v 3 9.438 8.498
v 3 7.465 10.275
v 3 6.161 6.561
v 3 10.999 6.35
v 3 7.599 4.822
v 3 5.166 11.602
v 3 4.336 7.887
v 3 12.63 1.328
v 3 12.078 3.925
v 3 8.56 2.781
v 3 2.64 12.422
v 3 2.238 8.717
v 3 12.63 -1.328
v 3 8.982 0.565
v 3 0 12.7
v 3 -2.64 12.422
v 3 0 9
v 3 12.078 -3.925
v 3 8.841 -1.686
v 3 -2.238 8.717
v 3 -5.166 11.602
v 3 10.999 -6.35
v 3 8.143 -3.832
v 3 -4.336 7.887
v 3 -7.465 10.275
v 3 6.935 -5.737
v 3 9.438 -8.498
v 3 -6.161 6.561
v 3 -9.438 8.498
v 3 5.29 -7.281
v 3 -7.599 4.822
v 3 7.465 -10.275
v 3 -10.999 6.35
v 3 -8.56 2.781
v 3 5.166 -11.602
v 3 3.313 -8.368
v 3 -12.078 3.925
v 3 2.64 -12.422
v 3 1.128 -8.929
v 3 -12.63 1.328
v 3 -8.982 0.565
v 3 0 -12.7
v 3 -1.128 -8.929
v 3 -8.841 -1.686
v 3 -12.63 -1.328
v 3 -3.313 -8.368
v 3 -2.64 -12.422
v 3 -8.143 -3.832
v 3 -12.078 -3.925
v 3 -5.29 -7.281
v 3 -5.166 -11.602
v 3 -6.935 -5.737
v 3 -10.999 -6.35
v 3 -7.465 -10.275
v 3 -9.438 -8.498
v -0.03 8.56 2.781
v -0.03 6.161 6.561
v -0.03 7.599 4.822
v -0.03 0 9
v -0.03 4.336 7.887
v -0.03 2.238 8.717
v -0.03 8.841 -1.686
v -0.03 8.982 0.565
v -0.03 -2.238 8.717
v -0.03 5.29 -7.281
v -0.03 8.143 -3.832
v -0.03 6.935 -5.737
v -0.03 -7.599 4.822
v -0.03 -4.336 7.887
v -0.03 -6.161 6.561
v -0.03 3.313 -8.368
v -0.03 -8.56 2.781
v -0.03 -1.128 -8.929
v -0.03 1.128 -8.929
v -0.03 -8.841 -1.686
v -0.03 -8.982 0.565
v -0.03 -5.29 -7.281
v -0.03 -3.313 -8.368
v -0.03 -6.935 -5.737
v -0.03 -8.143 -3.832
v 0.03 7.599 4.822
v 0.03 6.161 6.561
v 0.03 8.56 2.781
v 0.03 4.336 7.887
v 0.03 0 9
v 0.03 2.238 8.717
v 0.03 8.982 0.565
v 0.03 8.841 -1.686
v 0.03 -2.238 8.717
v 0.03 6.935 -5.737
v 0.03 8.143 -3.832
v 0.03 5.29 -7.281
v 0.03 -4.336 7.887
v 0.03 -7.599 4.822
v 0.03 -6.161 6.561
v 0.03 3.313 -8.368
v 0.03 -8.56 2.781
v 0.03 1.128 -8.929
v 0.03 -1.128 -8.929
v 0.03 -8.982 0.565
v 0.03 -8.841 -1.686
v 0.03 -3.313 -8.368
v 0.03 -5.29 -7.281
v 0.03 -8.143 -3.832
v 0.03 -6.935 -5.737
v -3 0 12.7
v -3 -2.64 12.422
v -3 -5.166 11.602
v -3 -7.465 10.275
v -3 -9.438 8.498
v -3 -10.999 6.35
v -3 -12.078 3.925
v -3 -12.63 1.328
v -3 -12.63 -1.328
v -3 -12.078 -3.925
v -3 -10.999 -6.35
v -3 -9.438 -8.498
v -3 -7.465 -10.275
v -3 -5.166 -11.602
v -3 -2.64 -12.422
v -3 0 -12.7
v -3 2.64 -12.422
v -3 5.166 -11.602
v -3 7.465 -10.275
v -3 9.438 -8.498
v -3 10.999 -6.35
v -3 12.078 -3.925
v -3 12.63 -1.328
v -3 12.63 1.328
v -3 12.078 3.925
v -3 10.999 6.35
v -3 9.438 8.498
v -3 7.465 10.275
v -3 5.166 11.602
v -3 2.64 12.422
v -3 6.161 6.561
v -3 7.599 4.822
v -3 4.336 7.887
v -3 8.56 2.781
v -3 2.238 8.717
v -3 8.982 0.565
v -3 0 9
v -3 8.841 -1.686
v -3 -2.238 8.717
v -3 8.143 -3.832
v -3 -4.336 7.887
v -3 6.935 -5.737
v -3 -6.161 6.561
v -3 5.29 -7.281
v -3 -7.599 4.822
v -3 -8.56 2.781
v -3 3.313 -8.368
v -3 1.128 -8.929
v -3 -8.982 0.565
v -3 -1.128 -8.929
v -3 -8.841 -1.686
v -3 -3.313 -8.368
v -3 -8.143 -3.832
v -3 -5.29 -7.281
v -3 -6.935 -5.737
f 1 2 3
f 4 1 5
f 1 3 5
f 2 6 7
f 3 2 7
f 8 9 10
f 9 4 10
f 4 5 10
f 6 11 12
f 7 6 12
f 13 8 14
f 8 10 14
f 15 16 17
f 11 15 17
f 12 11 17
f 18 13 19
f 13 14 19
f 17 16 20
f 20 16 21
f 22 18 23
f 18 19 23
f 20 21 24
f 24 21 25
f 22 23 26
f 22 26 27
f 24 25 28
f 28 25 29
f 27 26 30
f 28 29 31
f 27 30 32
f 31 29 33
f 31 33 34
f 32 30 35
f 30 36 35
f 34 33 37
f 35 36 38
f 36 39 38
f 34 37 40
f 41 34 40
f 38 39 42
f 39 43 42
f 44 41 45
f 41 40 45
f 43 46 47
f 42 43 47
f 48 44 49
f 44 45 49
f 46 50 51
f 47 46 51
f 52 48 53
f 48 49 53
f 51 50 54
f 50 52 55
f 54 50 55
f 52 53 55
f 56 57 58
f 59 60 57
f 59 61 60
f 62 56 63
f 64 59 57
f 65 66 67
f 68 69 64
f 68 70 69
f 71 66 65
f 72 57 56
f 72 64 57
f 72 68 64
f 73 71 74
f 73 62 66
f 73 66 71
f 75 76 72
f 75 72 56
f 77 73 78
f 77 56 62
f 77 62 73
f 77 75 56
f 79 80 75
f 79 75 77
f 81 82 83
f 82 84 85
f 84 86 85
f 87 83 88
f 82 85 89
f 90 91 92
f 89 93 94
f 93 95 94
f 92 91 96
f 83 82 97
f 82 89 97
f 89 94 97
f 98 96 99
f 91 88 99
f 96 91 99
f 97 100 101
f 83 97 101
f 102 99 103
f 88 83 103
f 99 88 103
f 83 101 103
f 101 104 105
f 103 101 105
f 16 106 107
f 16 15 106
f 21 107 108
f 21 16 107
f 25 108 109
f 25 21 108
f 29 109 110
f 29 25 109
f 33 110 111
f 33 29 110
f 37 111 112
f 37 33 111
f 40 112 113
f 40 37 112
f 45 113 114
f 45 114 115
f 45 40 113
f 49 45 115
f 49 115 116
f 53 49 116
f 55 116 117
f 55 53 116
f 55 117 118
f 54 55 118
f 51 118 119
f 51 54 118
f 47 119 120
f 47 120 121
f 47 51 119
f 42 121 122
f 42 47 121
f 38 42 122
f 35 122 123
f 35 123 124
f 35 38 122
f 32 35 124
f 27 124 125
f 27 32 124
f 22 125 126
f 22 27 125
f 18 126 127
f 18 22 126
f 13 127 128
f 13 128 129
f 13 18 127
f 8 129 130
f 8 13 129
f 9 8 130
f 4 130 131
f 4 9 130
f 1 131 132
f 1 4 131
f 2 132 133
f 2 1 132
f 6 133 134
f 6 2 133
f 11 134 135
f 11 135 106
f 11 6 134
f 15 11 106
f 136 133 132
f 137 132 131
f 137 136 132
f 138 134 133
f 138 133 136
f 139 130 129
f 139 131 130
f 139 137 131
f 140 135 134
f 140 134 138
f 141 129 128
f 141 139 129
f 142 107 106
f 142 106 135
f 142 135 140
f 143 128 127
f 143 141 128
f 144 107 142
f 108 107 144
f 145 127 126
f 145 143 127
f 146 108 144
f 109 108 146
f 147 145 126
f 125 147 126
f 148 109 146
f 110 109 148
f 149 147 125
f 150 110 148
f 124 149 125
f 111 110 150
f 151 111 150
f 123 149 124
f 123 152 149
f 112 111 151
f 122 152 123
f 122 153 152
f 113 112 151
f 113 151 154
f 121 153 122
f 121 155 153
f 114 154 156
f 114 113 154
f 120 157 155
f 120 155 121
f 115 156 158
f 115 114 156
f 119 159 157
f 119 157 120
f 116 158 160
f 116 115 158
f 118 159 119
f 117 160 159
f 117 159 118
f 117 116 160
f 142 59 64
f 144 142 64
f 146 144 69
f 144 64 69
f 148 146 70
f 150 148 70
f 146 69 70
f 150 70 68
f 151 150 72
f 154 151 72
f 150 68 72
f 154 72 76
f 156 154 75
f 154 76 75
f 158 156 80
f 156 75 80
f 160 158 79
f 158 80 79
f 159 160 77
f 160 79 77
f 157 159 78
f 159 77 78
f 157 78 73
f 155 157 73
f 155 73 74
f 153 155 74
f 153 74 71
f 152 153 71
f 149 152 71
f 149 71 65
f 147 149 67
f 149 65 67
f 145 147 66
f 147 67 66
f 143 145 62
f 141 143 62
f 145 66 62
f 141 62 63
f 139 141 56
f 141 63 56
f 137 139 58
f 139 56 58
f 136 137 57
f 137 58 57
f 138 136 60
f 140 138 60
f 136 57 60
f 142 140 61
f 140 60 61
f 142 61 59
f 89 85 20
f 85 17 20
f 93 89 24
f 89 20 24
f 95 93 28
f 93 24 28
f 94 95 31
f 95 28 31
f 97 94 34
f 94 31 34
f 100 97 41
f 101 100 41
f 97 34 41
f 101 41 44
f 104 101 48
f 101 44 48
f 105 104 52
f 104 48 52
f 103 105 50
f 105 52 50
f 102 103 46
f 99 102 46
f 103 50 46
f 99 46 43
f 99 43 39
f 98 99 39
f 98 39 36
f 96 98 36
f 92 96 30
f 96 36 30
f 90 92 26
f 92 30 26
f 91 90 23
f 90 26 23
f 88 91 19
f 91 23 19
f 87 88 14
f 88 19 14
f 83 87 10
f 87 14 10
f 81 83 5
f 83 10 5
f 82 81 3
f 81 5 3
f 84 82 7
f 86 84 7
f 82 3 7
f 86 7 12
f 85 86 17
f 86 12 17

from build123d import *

# Parameters (mm, degrees)
SKETCH_1_W = 0.061
SKETCH_1_H = 9
SKETCH_4_W = 6
SKETCH_4_H = 3.7


with BuildPart() as part:
    # 草图1 → 旋转2 (revolve)
    with BuildSketch(Plane.XY, mode=Mode.PRIVATE) as revolve_2_sk:
        with Locations((0, 4.5)):
            Rectangle(SKETCH_1_W, SKETCH_1_H)
    revolve(revolve_2_sk.sketch.rotate(Axis((-0.0305, 0, 0), (1, 0, 0)), 90), axis=Axis((-0.0305, 0, 0), (1, 0, 0)))  # turned: the seam where the file's is

    # 草图4 → 旋转3 (revolve)
    with BuildSketch(Plane.XY, mode=Mode.PRIVATE) as revolve_3_sk:
        with Locations((0, 10.85)):
            Rectangle(SKETCH_4_W, SKETCH_4_H)
    revolve(revolve_3_sk.sketch.rotate(Axis((-1.614212419, 0, 0), (1, 0, 0)), 90), axis=Axis((-1.614212419, 0, 0), (1, 0, 0)))  # turned: the seam where the file's is


solid = part.part
